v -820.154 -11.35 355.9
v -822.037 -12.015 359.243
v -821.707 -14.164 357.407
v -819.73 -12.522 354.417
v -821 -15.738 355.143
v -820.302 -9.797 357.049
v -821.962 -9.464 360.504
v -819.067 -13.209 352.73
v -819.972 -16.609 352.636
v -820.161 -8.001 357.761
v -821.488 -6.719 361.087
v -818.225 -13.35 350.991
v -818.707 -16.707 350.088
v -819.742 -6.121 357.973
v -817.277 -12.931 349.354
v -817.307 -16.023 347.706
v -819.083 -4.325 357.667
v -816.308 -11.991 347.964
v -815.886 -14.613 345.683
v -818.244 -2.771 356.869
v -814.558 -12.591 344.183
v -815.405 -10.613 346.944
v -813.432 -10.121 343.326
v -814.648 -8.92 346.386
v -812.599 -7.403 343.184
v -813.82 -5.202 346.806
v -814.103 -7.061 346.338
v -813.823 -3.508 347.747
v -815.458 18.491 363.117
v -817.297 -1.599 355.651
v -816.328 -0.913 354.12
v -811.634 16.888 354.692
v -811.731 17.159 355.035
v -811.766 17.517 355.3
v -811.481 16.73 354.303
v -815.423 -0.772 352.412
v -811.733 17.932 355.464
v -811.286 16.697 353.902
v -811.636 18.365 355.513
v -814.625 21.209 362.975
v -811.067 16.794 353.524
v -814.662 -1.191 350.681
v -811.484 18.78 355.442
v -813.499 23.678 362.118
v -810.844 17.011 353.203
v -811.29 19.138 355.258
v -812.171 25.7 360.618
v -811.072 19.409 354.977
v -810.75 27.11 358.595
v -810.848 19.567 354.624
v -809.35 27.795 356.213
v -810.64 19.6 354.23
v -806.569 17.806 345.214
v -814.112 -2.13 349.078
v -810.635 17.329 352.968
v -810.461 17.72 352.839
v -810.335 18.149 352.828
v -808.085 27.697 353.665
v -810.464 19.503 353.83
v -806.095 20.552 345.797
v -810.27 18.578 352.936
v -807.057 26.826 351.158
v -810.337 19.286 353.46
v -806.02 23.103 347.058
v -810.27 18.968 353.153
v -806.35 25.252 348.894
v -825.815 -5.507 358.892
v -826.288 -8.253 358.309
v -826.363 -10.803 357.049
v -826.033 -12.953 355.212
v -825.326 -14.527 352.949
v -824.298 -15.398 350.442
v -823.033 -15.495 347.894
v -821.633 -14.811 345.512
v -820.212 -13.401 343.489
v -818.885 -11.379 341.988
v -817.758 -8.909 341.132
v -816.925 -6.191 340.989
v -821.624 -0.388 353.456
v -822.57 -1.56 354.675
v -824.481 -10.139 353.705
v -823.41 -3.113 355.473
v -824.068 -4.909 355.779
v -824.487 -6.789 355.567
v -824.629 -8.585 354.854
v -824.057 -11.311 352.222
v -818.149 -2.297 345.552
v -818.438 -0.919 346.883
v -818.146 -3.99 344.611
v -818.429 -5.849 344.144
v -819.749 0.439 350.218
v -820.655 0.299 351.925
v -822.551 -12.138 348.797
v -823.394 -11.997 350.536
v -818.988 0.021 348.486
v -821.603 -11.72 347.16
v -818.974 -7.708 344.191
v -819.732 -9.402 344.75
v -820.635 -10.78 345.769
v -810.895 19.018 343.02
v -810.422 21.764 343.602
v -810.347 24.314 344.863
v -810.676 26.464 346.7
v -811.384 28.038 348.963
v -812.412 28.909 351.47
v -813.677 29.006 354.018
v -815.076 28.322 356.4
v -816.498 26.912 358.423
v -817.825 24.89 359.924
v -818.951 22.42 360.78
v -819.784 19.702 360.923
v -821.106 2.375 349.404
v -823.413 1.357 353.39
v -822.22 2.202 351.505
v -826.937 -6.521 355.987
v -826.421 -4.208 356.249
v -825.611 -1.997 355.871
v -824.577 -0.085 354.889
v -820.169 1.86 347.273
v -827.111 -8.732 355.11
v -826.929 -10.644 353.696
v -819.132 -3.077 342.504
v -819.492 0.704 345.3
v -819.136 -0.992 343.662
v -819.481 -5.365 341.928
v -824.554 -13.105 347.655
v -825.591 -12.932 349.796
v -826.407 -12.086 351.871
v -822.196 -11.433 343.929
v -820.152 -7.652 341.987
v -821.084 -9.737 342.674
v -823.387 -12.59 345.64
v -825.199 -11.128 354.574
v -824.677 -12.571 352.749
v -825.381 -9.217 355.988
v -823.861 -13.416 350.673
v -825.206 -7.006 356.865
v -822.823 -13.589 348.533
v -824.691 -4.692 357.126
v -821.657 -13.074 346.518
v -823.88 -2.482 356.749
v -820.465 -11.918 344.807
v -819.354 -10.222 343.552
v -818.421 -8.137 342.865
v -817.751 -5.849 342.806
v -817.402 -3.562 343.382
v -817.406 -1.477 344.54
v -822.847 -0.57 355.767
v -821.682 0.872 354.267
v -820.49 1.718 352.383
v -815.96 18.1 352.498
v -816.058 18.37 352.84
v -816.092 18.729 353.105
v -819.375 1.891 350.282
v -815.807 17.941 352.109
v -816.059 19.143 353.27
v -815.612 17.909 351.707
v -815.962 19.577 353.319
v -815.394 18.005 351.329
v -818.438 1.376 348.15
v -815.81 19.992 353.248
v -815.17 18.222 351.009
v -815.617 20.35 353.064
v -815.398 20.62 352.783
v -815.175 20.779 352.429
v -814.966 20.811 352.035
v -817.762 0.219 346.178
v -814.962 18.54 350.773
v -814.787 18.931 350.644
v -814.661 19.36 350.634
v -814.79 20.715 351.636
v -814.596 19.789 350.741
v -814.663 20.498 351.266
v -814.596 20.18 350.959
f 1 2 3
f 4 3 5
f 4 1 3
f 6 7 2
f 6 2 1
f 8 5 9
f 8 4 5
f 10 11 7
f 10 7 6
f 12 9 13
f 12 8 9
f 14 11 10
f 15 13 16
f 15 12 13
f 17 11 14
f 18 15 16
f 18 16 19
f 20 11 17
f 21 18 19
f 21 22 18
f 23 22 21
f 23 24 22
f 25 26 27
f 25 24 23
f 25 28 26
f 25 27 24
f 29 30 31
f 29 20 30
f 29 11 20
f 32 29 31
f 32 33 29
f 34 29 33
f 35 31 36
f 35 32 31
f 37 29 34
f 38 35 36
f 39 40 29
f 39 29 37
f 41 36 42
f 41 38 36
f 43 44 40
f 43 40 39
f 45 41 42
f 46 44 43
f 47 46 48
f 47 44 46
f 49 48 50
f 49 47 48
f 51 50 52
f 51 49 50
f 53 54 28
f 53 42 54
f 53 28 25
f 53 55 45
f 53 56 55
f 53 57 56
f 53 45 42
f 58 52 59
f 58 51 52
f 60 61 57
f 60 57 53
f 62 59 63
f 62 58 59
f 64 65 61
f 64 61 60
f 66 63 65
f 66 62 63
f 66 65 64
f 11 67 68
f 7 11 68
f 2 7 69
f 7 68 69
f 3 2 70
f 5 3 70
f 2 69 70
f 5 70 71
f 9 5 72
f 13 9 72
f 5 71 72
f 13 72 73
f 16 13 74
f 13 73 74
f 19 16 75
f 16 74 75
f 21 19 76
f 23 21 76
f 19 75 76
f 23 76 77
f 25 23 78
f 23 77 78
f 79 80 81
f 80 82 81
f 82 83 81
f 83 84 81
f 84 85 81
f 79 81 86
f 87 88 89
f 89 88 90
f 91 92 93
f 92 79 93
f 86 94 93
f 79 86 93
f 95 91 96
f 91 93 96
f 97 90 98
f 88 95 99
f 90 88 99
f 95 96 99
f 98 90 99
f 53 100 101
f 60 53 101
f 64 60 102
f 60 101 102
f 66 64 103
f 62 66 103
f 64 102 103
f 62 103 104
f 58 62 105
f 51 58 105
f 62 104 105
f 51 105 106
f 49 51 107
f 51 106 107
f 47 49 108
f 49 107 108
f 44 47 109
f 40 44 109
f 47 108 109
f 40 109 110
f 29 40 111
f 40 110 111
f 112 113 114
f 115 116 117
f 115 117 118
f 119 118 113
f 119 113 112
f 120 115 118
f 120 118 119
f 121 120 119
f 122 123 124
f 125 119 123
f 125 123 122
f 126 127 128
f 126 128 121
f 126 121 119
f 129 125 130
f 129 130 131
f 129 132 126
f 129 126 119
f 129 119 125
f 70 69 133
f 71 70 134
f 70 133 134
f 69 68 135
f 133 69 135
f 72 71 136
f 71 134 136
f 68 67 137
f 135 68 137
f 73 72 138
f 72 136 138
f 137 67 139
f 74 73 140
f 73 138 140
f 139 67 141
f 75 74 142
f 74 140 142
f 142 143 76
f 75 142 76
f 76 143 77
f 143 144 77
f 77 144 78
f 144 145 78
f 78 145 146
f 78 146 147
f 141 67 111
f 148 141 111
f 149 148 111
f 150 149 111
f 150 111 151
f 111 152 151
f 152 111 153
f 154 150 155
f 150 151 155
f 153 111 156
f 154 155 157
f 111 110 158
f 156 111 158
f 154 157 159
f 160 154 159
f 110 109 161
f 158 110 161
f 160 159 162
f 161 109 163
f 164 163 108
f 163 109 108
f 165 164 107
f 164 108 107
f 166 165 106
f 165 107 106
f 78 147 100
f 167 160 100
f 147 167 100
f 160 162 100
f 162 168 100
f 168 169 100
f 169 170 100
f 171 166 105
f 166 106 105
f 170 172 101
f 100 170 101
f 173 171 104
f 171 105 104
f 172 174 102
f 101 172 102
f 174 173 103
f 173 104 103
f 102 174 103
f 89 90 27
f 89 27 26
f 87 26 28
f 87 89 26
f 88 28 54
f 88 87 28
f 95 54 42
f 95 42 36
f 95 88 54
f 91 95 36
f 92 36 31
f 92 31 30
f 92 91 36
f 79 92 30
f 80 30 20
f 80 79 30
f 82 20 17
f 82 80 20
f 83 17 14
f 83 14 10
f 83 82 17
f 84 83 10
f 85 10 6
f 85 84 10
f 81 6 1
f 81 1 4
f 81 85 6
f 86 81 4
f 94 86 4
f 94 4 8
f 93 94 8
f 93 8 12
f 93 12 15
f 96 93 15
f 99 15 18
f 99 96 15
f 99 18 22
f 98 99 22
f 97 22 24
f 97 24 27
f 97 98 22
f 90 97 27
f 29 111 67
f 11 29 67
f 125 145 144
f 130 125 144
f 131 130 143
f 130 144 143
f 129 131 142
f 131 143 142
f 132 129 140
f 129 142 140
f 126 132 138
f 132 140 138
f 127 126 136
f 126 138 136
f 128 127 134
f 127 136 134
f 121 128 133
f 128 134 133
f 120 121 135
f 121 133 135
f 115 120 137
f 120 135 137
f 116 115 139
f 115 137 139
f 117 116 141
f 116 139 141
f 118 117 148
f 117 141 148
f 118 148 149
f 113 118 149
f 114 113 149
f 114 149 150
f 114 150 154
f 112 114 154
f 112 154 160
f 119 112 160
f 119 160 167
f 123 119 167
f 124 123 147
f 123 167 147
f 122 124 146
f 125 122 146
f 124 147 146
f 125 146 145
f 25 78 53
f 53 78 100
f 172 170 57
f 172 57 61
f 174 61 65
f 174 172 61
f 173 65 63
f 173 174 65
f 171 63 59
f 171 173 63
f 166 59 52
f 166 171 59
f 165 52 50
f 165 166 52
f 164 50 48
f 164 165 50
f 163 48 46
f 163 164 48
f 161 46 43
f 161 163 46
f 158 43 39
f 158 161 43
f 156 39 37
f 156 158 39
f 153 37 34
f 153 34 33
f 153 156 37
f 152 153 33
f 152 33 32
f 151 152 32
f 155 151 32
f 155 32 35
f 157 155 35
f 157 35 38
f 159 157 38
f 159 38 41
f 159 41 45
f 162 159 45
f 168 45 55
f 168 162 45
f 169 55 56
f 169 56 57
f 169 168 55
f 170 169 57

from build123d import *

# Parameters (mm, degrees)
SKETCH_1_R      = 1.5
SKETCH_1_R_2    = 6.5
EXTRUDE_1_DEPTH = 5
SKETCH_3_R      = 8
EXTRUDE_2_DEPTH = 2


with BuildPart() as part:
    # Эскиз1 → Бобышка-Вытянуть1 (new body)
    with BuildSketch(Plane(origin=(-480.803789864, 134.652080906, -243.886731474), x_dir=(0.4444744759103933, -0.03421577425644369, -0.8951378223805614), z_dir=(0.865247481188387, -0.24231791906874578, 0.4388950015611307))):
        with BuildLine():
            Line((-688.122906945, -142.837632594), (-688.122906945, -168.837632594))
            ThreePointArc((-688.122906945, -168.837632594), (-678.122906945, -178.837632594), (-668.122906945, -168.837632594))
            Line((-668.122906945, -168.837632594), (-668.122906945, -142.837632594))
            ThreePointArc((-668.122906945, -142.837632594), (-678.122906945, -132.837632594), (-688.122906945, -142.837632594))
        make_face()
        with Locations(Location((-678.122906945, -142.837632594, 0), (0, 0, 2.021059913))):
            Circle(SKETCH_1_R, mode=Mode.SUBTRACT)
        with Locations(Location((-678.122906945, -168.837632594, 0), (0, 0, 2.021059913))):
            Circle(SKETCH_1_R_2, mode=Mode.SUBTRACT)
    extrude(amount=EXTRUDE_1_DEPTH)

    # Эскиз3 → Бобышка-Вытянуть2 (add)
    with BuildSketch(Plane(origin=(-480.803789864, 134.652080906, -243.886731474), x_dir=(0.10581409215127123, 0.9439807153609489, 0.31257604983241044), z_dir=(-0.865247481188387, 0.24231791906874575, -0.4388950015611306))):
        with Locations(Location((16.948979253, -698.619750083, 0), (0, 0, 103.349815393))):
            Circle(SKETCH_3_R)
    extrude(amount=EXTRUDE_2_DEPTH)


solid = part.part
